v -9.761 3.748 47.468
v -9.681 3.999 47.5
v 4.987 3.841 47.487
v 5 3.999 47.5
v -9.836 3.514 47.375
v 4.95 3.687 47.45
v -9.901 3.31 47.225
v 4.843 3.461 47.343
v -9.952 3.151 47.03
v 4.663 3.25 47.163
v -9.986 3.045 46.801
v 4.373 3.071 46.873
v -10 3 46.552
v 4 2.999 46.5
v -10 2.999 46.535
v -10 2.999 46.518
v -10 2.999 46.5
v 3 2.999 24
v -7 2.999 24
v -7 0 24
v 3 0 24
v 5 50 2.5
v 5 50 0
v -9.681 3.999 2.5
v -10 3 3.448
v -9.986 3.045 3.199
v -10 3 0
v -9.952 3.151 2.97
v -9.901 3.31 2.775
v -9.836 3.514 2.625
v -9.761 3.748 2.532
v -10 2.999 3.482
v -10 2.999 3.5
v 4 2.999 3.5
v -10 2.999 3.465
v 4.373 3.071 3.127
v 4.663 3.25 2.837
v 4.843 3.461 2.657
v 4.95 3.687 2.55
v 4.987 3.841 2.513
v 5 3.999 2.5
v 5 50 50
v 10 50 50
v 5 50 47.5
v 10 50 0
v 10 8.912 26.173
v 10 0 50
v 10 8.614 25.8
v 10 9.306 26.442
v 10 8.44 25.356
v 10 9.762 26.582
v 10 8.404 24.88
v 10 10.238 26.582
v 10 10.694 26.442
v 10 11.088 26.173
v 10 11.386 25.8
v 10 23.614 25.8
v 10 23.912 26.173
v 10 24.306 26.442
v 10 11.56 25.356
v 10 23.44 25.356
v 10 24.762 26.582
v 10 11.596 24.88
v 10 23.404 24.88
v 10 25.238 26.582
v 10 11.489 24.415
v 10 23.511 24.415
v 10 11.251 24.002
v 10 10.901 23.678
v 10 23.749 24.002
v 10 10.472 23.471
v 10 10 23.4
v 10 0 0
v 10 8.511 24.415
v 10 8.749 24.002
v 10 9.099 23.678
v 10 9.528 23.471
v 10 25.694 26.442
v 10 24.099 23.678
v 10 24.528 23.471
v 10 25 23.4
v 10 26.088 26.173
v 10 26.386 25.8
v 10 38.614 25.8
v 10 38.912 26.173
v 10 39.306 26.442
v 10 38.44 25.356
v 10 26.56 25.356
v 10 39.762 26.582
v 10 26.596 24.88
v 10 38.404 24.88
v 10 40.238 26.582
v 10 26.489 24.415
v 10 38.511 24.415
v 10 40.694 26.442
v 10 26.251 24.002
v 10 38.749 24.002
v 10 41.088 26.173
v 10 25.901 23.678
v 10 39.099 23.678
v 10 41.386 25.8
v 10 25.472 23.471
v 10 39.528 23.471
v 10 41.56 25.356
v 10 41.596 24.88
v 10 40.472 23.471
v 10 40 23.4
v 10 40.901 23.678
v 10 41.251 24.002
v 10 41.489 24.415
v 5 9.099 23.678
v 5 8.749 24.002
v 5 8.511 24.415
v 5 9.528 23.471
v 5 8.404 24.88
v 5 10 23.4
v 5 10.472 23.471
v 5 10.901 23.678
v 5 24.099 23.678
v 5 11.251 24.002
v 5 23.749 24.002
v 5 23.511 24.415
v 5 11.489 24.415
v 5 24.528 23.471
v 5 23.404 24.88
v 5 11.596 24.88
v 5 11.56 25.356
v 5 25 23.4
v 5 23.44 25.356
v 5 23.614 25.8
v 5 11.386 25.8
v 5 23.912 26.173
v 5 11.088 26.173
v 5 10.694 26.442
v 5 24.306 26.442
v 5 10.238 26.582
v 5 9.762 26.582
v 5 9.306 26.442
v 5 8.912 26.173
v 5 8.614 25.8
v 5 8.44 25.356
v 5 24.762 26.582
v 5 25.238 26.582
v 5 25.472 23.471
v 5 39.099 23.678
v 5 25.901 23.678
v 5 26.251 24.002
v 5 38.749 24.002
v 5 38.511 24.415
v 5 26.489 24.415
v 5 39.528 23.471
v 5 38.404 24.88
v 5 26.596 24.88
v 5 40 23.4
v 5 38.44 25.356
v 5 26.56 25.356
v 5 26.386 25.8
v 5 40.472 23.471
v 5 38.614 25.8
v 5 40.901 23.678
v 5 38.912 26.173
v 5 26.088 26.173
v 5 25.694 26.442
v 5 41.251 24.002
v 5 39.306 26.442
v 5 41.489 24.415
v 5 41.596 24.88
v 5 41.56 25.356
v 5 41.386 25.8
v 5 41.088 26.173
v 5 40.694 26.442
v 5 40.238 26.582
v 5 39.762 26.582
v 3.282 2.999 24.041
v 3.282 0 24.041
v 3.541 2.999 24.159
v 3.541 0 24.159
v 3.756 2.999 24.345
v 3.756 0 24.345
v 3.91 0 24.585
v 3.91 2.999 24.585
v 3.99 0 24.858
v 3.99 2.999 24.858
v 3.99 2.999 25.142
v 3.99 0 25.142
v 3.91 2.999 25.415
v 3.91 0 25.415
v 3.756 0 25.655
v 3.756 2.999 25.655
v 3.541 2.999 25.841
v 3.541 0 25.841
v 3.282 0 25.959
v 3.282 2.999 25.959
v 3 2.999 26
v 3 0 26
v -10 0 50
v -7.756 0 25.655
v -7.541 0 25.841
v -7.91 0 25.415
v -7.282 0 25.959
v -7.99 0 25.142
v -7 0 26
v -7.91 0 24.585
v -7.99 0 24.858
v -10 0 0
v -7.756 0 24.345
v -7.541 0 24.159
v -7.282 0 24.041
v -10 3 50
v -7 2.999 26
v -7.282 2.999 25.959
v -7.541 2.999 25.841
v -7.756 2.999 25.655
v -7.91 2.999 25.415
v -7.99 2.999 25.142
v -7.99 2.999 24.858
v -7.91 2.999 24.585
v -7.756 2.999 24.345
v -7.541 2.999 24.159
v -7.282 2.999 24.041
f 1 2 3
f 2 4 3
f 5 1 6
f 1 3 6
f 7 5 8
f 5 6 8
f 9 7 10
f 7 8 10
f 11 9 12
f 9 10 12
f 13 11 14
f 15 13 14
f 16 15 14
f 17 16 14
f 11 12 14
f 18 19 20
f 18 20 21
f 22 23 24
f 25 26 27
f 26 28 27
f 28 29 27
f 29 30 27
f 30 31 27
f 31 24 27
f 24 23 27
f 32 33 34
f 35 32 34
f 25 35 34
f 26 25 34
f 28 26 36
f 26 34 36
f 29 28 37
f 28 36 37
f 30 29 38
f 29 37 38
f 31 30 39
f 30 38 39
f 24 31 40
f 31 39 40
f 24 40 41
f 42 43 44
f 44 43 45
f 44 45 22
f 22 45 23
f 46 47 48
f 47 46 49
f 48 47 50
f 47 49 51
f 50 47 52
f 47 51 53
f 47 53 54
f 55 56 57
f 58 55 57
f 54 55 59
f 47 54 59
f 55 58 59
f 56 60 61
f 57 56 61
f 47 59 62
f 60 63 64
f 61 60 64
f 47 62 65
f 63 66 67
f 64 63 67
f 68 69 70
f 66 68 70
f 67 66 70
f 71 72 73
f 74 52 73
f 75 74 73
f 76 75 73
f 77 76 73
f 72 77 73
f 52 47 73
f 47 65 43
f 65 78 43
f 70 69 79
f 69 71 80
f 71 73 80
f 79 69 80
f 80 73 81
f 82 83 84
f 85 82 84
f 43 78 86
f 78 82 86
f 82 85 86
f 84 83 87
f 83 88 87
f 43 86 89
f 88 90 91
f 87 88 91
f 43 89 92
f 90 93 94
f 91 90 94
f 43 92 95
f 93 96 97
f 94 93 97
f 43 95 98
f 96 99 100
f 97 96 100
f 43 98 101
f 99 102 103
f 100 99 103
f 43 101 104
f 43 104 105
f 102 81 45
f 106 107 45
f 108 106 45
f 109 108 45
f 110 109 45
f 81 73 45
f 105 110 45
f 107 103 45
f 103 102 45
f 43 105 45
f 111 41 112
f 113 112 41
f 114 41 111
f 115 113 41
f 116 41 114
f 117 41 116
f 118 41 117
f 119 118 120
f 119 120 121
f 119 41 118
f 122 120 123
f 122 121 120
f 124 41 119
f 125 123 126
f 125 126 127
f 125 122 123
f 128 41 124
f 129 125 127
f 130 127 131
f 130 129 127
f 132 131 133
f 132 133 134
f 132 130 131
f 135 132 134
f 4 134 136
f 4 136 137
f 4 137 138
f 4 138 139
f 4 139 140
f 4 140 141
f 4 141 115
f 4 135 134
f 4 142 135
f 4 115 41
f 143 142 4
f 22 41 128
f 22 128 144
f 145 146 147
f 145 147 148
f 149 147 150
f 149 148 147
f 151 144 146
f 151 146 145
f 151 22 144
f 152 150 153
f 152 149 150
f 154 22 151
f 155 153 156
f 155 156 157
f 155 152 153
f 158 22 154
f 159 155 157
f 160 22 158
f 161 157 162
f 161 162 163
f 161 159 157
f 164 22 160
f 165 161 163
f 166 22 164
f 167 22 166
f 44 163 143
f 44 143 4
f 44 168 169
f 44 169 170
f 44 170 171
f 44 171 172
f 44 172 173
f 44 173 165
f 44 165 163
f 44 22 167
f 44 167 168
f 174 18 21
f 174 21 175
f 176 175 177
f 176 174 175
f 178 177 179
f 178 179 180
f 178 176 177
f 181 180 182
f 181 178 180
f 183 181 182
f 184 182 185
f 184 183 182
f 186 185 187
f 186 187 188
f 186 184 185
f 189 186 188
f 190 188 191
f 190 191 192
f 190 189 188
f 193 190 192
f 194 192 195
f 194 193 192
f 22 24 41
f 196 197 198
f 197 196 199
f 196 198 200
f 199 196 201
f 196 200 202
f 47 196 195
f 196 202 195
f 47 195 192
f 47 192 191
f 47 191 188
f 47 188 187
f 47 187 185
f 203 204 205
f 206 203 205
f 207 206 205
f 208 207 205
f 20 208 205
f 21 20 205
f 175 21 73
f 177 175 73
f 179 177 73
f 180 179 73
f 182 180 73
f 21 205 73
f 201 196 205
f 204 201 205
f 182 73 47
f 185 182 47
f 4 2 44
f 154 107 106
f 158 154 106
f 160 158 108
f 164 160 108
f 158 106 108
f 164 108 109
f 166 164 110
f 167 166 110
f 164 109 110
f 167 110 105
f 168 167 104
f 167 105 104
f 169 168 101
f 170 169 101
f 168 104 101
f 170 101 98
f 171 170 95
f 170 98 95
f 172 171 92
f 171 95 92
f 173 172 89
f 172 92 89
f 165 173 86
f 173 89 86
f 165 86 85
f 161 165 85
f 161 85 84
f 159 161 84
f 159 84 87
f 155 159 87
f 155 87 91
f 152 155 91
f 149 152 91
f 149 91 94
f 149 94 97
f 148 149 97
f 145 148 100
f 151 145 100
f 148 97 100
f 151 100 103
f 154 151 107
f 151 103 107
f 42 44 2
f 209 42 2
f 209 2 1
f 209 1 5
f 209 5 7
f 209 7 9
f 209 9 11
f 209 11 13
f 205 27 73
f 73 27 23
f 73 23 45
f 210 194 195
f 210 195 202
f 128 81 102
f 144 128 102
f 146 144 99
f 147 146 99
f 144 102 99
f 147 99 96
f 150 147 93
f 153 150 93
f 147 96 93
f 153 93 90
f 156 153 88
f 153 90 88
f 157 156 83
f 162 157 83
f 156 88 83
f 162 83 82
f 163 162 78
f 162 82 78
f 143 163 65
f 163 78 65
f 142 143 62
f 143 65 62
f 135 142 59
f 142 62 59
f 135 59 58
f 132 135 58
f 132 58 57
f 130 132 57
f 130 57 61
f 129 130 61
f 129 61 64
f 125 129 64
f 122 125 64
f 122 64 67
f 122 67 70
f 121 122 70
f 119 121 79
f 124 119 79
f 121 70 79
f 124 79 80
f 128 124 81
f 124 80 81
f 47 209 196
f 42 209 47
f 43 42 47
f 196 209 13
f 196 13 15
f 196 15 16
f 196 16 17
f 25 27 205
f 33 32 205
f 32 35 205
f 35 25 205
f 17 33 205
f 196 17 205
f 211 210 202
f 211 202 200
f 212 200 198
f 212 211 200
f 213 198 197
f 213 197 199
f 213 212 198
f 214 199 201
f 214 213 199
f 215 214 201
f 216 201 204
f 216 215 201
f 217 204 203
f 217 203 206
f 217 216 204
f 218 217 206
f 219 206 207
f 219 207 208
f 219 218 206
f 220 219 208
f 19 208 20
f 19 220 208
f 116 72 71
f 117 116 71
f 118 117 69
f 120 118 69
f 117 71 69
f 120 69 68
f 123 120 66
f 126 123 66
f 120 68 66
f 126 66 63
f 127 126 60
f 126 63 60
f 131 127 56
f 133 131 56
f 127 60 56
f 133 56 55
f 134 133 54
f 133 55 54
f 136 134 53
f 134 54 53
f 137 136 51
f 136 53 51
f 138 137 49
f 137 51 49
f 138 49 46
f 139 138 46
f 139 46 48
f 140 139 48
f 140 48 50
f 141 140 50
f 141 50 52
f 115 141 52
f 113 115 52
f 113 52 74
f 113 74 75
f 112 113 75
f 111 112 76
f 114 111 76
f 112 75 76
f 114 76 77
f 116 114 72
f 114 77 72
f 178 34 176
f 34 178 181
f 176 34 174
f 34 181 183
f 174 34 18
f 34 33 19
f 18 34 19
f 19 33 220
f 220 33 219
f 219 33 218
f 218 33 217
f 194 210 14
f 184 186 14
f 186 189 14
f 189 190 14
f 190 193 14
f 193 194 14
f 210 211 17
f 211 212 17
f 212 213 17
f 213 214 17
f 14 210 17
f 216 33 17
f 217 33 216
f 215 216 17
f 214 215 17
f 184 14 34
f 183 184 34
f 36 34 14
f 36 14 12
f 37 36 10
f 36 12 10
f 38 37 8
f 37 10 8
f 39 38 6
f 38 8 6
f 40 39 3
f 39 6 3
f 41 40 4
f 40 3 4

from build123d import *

# Parameters (mm, degrees)
BOSS_EXTRUDE1_DEPTH = 50
SKETCH4_W           = 45
SKETCH4_H           = 47.001372255
CUT_EXTRUDE2_DEPTH  = 15
SKETCH6_R           = 1.6
CUT_EXTRUDE4_DEPTH  = 5
CUT_EXTRUDE5_DEPTH  = 2.998627745
FILLET1_R           = 1


with BuildPart() as part:
    # Sketch1 → Boss-Extrude1 (new body)
    with BuildSketch(Plane.XY):
        Polygon((-10, 0), (10, 0), (10, 50), (5, 50), (-10, 3), align=None)
    extrude(amount=BOSS_EXTRUDE1_DEPTH)

    # Sketch4 → Cut-Extrude2 (cut)
    with BuildSketch(Plane.ZY.offset(10)):
        with Locations((25, 26.499313873)):
            Rectangle(SKETCH4_W, SKETCH4_H)
    extrude(amount=-CUT_EXTRUDE2_DEPTH, mode=Mode.SUBTRACT)

    # Sketch6 → Cut-Extrude4 (cut)
    with BuildSketch(Plane(origin=(10, 0, 0), x_dir=(0, 0, -1), z_dir=(1, 0, 0))):
        with Locations((-25, 25)):
            Circle(SKETCH6_R)
        with Locations((-25, 10)):
            Circle(SKETCH6_R)
        with Locations((-25, 40)):
            Circle(SKETCH6_R)
    extrude(amount=-CUT_EXTRUDE4_DEPTH, mode=Mode.SUBTRACT)

    # Sketch7 → Cut-Extrude5 (cut)
    with BuildSketch(Plane(origin=(0, 2.998627745, 0), x_dir=(1, 0, 0), z_dir=(0, 1, 0))):
        with BuildLine():
            Line((-7, -24), (3, -24))
            ThreePointArc((3, -24), (4, -25), (3, -26))
            Line((3, -26), (-7, -26))
            ThreePointArc((-7, -26), (-8, -25), (-7, -24))
        make_face()
    extrude(amount=-CUT_EXTRUDE5_DEPTH, mode=Mode.SUBTRACT)

    # Fillet1
    fillet1_edges = [part.edges().sort_by_distance(p)[0] for p in [
        (5, 2.998627745, 25),
        (-2.5, 2.998627745, 47.5),
        (-2.5, 2.998627745, 2.5),
    ]]
    fillet(fillet1_edges, radius=FILLET1_R - 0.0001)  # a hair under: the kernel refuses the full size


solid = part.part
